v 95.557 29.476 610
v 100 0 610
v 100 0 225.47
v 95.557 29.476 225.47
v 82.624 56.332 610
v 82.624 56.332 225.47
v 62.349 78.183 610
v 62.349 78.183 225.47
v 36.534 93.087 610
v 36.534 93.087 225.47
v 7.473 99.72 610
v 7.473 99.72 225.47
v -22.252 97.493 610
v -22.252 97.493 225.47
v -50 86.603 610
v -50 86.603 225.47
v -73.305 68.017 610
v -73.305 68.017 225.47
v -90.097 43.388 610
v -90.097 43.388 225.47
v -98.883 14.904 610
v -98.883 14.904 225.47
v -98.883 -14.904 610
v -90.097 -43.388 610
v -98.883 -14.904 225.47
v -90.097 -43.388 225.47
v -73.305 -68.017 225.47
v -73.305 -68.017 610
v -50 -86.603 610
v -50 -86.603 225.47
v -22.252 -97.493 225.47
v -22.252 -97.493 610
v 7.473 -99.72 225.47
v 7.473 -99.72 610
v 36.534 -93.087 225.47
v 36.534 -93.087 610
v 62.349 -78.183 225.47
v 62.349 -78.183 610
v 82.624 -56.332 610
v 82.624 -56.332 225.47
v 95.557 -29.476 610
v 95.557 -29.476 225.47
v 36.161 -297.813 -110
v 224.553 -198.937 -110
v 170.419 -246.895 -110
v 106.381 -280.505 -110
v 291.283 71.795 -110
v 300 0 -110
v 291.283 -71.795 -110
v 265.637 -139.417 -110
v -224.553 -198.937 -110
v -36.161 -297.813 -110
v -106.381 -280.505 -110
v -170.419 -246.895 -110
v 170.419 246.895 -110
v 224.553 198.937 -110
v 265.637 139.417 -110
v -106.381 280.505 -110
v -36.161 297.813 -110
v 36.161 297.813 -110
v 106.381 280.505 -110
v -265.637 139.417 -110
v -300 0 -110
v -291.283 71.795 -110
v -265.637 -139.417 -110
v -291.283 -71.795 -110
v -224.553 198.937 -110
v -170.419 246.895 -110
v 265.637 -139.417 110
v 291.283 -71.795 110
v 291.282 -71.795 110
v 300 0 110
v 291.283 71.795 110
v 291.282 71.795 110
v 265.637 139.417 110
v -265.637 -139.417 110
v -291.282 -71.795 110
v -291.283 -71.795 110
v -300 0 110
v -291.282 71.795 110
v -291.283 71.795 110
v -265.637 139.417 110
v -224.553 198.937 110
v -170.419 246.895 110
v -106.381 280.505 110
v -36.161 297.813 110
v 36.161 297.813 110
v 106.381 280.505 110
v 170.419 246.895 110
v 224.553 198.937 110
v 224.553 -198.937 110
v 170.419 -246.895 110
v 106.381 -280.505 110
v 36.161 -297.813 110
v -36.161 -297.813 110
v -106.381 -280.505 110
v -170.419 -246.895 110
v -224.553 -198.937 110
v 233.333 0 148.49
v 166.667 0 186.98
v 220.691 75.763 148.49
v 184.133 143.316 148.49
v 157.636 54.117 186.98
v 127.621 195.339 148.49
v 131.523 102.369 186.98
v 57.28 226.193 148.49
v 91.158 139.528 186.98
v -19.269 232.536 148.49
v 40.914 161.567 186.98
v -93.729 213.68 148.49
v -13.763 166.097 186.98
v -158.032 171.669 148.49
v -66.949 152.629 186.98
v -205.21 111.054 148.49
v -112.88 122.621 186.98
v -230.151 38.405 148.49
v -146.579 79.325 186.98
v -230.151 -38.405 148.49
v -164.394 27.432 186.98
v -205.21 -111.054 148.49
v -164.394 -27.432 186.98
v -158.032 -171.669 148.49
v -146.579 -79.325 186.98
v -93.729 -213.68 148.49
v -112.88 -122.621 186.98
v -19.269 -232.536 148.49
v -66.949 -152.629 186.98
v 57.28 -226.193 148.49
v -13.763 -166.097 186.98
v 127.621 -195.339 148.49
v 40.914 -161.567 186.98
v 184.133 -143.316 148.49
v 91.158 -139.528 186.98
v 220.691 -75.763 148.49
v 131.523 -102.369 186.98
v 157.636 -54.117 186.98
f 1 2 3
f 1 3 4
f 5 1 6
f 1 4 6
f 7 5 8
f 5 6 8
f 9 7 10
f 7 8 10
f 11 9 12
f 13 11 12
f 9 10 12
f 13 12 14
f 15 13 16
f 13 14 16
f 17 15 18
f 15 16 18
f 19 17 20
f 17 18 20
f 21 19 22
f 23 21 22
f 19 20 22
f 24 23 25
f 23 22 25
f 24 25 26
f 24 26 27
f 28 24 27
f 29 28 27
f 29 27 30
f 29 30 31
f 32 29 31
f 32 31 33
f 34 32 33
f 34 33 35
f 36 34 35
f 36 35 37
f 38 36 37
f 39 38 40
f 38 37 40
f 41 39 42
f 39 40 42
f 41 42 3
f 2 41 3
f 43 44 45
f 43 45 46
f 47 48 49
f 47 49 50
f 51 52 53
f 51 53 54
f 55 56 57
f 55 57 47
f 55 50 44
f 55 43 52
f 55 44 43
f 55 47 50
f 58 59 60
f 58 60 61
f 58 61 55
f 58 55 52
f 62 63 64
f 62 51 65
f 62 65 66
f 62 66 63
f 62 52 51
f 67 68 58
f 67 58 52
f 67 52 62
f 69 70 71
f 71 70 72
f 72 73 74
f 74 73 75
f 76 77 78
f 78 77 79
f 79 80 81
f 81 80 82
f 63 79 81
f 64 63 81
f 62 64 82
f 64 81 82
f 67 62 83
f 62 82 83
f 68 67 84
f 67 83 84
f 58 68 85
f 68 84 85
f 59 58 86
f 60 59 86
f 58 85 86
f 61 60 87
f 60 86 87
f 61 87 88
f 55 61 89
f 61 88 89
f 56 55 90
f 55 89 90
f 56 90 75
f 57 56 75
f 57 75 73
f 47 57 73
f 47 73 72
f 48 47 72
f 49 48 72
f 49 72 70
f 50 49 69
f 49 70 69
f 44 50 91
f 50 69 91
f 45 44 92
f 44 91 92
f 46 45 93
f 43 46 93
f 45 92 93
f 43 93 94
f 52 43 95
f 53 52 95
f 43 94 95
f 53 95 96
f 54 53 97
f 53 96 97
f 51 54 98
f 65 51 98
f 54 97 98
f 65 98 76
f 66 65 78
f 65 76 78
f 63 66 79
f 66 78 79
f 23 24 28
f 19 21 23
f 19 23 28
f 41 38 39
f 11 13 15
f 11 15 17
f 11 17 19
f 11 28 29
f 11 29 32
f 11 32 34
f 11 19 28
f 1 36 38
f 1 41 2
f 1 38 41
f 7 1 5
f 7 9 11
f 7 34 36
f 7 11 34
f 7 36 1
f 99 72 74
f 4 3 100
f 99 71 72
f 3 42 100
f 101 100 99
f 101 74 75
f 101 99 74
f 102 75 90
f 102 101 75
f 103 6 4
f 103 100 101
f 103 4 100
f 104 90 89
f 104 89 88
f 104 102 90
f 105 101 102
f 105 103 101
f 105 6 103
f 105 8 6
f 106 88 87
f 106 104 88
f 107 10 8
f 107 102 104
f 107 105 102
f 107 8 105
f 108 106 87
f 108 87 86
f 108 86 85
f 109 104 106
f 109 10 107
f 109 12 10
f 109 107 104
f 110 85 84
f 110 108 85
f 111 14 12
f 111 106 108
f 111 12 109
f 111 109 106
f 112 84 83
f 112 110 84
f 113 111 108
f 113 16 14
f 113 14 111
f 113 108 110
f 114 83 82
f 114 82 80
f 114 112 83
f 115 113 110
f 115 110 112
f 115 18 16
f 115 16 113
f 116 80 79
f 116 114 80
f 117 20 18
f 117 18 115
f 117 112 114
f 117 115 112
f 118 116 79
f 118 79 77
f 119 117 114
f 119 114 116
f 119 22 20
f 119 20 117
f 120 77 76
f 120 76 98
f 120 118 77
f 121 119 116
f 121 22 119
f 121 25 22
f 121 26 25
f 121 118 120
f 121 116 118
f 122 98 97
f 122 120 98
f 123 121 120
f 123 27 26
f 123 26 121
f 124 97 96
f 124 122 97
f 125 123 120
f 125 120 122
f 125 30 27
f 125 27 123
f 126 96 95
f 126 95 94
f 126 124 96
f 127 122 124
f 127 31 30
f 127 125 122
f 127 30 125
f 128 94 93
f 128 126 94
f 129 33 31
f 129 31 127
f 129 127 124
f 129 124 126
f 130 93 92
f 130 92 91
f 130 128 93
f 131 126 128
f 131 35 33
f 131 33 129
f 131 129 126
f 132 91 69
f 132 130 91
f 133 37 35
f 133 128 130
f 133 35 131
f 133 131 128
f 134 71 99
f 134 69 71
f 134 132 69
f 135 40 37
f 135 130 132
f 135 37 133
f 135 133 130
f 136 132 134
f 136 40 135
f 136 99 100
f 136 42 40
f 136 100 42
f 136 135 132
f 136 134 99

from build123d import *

# Parameters (mm, degrees)
BOSS_EXTRUDE1_DEPTH      = 250
BOSS_EXTRUDE1_DEPTH_BACK = 250
SKETCH1_R                = 100
SKETCH2_R                = 300
BOSS_EXTRUDE2_DEPTH      = 220
CHAMFER1_SIZE2           = 115.470053838
CHAMFER1_SIZE            = 200


with BuildPart() as part:
    # Sketch1 → Boss-Extrude1 (new, two sides: drawn at the far end of the back side and taken through both)
    with BuildSketch(Plane.XY.offset(-BOSS_EXTRUDE1_DEPTH_BACK)):
        Circle(SKETCH1_R)
    extrude(amount=BOSS_EXTRUDE1_DEPTH + BOSS_EXTRUDE1_DEPTH_BACK)

    # Sketch2 → Boss-Extrude2 (add)
    with BuildSketch(Plane(origin=(0, 0, -250), x_dir=(-1, 0, 0), z_dir=(0, 0, -1))):
        Circle(SKETCH2_R)
    extrude(amount=BOSS_EXTRUDE2_DEPTH)

    # Chamfer1
    chamfer1_edges = [part.edges().sort_by_distance(p)[0] for p in [
        (-100, 0, -250),
    ]]
    chamfer1_side = [part.faces().sort_by_distance(p)[0] for p in [
        (-102.309401077, 0, -250),
    ]]
    chamfer(chamfer1_edges, length=CHAMFER1_SIZE - 0.0001, length2=CHAMFER1_SIZE2 - 0.0001, reference=chamfer1_side[0])  # a hair under: the kernel refuses the full size


with BuildPart() as part_1:
    # Body-Move/Copy1: moved
    add(part.part.moved(Location((0, 0, 360))))


solid = part_1.part
